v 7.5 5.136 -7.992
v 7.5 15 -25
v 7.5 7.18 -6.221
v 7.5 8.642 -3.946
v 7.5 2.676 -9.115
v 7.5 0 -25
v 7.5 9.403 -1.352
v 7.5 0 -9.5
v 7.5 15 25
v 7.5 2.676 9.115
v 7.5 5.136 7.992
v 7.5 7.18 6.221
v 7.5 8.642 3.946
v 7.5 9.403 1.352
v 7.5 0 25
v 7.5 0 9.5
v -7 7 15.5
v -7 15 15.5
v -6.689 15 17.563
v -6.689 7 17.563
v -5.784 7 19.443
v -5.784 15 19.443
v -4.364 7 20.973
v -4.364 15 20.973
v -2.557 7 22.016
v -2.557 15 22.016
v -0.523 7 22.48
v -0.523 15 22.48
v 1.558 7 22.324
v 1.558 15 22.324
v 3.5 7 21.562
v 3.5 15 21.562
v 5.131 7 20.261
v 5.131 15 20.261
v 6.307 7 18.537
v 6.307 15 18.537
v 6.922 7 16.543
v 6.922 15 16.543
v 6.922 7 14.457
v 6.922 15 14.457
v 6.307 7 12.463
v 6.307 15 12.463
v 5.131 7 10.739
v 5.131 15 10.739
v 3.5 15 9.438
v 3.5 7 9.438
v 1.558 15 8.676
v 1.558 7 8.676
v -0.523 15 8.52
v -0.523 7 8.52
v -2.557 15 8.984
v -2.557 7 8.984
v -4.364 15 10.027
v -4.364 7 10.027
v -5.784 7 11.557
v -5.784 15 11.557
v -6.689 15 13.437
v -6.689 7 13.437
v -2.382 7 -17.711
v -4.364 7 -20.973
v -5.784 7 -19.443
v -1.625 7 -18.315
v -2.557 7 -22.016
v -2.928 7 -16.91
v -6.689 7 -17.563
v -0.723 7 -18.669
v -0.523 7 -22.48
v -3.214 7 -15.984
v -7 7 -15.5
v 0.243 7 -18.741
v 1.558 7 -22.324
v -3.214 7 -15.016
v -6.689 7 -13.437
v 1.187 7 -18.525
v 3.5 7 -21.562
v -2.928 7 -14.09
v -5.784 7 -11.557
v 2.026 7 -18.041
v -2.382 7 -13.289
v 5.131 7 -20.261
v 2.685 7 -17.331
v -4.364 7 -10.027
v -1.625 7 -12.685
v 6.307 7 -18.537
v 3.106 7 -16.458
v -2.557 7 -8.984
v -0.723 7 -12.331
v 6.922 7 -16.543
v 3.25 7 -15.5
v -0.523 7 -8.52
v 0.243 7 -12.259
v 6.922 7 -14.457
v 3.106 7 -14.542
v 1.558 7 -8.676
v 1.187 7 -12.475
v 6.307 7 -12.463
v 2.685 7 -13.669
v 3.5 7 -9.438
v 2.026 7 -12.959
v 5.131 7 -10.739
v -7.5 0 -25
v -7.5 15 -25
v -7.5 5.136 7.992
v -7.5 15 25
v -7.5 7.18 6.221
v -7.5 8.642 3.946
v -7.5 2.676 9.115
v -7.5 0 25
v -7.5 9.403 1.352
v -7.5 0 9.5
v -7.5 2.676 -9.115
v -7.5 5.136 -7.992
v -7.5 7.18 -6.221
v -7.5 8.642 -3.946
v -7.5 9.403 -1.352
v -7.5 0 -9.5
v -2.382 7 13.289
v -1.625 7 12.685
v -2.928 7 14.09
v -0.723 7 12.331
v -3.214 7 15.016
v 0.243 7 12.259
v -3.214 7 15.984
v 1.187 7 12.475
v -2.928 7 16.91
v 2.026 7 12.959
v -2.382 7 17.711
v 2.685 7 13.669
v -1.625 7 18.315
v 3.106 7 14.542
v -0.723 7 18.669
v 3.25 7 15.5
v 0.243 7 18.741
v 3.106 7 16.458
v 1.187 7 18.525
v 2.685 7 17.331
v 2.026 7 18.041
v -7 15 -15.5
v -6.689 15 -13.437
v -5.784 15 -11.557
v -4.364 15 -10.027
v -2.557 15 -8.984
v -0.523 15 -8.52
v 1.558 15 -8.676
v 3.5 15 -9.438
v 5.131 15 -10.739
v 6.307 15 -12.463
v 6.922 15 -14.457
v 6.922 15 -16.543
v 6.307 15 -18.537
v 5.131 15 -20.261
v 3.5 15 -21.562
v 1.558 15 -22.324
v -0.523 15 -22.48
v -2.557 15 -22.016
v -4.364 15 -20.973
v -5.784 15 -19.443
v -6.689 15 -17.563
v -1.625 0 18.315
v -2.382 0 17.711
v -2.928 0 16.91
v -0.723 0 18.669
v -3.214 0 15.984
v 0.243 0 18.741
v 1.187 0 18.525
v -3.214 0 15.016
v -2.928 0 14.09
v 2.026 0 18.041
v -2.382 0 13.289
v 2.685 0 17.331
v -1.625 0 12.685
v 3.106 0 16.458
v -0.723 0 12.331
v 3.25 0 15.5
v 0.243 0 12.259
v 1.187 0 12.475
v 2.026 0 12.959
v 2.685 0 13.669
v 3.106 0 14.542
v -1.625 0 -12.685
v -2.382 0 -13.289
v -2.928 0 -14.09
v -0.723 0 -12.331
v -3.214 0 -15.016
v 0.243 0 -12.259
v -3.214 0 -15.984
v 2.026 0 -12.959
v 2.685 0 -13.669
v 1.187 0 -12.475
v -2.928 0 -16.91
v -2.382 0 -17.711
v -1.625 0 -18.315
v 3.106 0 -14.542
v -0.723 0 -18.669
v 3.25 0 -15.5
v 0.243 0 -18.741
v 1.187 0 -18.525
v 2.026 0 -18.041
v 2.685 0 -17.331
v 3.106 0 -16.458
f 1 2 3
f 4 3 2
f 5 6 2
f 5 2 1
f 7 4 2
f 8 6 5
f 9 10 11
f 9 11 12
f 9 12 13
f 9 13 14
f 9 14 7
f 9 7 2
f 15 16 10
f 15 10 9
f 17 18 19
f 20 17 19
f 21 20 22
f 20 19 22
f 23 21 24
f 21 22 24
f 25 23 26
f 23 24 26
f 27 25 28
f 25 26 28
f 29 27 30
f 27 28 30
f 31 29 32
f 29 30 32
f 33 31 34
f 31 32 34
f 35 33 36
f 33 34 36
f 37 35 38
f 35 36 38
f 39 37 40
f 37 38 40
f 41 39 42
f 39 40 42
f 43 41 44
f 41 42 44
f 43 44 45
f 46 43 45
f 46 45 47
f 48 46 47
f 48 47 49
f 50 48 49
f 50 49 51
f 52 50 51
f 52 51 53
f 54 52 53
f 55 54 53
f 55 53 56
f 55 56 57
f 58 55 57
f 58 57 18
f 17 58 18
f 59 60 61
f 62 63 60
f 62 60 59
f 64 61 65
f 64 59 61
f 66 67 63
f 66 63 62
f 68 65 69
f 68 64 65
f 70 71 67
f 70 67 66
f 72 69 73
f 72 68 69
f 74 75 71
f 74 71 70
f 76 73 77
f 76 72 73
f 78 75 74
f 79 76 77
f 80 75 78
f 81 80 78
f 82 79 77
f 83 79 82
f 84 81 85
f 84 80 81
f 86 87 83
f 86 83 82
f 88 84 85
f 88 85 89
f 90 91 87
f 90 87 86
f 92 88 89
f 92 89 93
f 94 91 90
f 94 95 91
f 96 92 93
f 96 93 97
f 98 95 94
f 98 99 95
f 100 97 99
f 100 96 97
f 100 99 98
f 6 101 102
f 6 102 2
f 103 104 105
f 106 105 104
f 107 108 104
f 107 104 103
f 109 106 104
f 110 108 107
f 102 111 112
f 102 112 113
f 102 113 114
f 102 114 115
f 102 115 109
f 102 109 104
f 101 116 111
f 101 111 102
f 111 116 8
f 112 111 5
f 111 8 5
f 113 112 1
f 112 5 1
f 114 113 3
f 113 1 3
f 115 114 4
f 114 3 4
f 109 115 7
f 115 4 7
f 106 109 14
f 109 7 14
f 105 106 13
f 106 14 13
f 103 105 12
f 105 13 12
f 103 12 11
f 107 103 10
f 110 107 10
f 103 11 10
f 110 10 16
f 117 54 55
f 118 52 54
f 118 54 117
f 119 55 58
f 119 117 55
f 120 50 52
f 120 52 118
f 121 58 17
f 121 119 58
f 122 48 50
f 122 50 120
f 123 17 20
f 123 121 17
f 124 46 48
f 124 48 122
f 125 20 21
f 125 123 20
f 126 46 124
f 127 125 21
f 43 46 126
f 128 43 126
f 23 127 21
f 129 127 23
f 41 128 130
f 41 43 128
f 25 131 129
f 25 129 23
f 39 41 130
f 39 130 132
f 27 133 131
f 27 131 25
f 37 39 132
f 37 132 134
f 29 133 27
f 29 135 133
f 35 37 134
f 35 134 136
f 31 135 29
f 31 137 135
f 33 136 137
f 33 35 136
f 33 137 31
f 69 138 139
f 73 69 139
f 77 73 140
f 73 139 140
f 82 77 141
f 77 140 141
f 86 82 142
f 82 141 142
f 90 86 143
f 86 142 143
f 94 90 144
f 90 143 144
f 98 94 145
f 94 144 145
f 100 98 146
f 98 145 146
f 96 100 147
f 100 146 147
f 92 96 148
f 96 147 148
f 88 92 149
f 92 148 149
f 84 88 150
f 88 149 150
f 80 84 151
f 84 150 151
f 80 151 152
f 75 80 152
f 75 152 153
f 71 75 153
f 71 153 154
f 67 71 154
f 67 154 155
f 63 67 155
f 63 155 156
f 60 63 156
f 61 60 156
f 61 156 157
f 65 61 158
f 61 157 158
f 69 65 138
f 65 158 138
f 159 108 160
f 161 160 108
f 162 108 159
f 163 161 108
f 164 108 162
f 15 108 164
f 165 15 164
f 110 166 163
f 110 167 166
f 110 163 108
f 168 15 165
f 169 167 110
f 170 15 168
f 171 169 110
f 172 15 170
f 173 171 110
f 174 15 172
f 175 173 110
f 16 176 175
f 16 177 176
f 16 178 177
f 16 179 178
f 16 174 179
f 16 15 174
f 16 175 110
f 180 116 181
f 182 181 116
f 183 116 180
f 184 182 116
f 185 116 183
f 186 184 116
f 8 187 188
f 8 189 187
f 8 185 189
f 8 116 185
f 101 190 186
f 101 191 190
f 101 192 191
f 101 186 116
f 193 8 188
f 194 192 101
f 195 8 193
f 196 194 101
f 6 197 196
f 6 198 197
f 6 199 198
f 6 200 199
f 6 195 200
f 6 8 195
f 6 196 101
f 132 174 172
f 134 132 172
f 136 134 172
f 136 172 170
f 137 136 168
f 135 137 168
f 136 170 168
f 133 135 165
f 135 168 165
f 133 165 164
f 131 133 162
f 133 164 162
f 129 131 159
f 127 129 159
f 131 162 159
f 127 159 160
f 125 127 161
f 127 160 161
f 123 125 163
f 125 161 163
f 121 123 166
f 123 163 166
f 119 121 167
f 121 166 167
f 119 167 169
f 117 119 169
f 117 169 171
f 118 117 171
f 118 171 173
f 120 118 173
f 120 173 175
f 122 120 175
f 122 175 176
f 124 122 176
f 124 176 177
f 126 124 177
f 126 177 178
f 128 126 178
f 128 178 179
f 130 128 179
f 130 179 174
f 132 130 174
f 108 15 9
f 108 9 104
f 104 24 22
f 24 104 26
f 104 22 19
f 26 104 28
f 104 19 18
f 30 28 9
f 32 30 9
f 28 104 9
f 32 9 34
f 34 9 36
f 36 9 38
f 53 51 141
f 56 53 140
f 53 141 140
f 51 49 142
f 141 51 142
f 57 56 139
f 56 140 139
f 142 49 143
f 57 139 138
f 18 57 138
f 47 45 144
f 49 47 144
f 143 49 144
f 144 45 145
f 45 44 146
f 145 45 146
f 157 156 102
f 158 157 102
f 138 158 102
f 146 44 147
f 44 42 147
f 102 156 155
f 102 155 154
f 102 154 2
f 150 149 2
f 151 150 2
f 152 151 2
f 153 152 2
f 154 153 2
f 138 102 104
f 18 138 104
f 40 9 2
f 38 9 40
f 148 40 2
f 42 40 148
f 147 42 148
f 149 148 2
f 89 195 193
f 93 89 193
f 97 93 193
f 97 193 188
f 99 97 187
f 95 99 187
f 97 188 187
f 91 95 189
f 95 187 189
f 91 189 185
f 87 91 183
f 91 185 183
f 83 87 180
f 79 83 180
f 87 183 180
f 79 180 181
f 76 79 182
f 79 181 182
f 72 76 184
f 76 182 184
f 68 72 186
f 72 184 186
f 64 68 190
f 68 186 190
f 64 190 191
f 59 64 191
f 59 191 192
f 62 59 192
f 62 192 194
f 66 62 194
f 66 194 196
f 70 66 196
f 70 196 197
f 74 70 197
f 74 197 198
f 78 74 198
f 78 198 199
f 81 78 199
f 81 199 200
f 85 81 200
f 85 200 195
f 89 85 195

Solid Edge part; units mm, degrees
sketch "Sketch1" plane through (0, 0, 0) normal (0, -1, 0) x (1, 0, 0)
  line L0 (-7.5, -25) -> (7.5, -25)
  line L1 (7.5, -25) -> (7.5, 25)
  line L2 (7.5, 25) -> (-7.5, 25)
  line L3 (-7.5, 25) -> (-7.5, -25)
  dimension "D1" = 15
  dimension "D2" = 50
extrude "Protrusion1" add sketch "Sketch1" against normal blind 15
sketch "Sketch2" plane through (7.5, 7.5, 0) normal (1, 0, 0) x (0, 1, 0)
  line L0 (-7.5, 9.5) -> (-7.5, -9.5)
  arc A0 (-7.5, 9.5) -> (-7.5, -9.5) centre (-7.5, 0) cw
extrude "Cutout1" cut sketch "Sketch2" against normal through all
sketch "Sketch3" plane through (0, 0, 0) normal (0, -1, 0) x (1, 0, 0)
  circle A0 centre (0, 15.5) radius 3.25
  circle A1 centre (0, -15.5) radius 3.25
  dimension "D1" = 15.5
  dimension "D2" = 6.5
  dimension "D3" = 15.5
extrude "Cutout2" cut sketch "Sketch3" against normal through all
sketch "Sketch4" plane through (0, 15, 0) normal (0, 1, 0) x (-1, 0, 0)
  circle A0 centre (0, 15.5) radius 7
  circle A1 centre (0, -15.5) radius 7
  dimension "D1" = 14
extrude "ExtrudedCutout_4" cut sketch "Sketch4" against normal blind 8
properties material "Stainless steel"
